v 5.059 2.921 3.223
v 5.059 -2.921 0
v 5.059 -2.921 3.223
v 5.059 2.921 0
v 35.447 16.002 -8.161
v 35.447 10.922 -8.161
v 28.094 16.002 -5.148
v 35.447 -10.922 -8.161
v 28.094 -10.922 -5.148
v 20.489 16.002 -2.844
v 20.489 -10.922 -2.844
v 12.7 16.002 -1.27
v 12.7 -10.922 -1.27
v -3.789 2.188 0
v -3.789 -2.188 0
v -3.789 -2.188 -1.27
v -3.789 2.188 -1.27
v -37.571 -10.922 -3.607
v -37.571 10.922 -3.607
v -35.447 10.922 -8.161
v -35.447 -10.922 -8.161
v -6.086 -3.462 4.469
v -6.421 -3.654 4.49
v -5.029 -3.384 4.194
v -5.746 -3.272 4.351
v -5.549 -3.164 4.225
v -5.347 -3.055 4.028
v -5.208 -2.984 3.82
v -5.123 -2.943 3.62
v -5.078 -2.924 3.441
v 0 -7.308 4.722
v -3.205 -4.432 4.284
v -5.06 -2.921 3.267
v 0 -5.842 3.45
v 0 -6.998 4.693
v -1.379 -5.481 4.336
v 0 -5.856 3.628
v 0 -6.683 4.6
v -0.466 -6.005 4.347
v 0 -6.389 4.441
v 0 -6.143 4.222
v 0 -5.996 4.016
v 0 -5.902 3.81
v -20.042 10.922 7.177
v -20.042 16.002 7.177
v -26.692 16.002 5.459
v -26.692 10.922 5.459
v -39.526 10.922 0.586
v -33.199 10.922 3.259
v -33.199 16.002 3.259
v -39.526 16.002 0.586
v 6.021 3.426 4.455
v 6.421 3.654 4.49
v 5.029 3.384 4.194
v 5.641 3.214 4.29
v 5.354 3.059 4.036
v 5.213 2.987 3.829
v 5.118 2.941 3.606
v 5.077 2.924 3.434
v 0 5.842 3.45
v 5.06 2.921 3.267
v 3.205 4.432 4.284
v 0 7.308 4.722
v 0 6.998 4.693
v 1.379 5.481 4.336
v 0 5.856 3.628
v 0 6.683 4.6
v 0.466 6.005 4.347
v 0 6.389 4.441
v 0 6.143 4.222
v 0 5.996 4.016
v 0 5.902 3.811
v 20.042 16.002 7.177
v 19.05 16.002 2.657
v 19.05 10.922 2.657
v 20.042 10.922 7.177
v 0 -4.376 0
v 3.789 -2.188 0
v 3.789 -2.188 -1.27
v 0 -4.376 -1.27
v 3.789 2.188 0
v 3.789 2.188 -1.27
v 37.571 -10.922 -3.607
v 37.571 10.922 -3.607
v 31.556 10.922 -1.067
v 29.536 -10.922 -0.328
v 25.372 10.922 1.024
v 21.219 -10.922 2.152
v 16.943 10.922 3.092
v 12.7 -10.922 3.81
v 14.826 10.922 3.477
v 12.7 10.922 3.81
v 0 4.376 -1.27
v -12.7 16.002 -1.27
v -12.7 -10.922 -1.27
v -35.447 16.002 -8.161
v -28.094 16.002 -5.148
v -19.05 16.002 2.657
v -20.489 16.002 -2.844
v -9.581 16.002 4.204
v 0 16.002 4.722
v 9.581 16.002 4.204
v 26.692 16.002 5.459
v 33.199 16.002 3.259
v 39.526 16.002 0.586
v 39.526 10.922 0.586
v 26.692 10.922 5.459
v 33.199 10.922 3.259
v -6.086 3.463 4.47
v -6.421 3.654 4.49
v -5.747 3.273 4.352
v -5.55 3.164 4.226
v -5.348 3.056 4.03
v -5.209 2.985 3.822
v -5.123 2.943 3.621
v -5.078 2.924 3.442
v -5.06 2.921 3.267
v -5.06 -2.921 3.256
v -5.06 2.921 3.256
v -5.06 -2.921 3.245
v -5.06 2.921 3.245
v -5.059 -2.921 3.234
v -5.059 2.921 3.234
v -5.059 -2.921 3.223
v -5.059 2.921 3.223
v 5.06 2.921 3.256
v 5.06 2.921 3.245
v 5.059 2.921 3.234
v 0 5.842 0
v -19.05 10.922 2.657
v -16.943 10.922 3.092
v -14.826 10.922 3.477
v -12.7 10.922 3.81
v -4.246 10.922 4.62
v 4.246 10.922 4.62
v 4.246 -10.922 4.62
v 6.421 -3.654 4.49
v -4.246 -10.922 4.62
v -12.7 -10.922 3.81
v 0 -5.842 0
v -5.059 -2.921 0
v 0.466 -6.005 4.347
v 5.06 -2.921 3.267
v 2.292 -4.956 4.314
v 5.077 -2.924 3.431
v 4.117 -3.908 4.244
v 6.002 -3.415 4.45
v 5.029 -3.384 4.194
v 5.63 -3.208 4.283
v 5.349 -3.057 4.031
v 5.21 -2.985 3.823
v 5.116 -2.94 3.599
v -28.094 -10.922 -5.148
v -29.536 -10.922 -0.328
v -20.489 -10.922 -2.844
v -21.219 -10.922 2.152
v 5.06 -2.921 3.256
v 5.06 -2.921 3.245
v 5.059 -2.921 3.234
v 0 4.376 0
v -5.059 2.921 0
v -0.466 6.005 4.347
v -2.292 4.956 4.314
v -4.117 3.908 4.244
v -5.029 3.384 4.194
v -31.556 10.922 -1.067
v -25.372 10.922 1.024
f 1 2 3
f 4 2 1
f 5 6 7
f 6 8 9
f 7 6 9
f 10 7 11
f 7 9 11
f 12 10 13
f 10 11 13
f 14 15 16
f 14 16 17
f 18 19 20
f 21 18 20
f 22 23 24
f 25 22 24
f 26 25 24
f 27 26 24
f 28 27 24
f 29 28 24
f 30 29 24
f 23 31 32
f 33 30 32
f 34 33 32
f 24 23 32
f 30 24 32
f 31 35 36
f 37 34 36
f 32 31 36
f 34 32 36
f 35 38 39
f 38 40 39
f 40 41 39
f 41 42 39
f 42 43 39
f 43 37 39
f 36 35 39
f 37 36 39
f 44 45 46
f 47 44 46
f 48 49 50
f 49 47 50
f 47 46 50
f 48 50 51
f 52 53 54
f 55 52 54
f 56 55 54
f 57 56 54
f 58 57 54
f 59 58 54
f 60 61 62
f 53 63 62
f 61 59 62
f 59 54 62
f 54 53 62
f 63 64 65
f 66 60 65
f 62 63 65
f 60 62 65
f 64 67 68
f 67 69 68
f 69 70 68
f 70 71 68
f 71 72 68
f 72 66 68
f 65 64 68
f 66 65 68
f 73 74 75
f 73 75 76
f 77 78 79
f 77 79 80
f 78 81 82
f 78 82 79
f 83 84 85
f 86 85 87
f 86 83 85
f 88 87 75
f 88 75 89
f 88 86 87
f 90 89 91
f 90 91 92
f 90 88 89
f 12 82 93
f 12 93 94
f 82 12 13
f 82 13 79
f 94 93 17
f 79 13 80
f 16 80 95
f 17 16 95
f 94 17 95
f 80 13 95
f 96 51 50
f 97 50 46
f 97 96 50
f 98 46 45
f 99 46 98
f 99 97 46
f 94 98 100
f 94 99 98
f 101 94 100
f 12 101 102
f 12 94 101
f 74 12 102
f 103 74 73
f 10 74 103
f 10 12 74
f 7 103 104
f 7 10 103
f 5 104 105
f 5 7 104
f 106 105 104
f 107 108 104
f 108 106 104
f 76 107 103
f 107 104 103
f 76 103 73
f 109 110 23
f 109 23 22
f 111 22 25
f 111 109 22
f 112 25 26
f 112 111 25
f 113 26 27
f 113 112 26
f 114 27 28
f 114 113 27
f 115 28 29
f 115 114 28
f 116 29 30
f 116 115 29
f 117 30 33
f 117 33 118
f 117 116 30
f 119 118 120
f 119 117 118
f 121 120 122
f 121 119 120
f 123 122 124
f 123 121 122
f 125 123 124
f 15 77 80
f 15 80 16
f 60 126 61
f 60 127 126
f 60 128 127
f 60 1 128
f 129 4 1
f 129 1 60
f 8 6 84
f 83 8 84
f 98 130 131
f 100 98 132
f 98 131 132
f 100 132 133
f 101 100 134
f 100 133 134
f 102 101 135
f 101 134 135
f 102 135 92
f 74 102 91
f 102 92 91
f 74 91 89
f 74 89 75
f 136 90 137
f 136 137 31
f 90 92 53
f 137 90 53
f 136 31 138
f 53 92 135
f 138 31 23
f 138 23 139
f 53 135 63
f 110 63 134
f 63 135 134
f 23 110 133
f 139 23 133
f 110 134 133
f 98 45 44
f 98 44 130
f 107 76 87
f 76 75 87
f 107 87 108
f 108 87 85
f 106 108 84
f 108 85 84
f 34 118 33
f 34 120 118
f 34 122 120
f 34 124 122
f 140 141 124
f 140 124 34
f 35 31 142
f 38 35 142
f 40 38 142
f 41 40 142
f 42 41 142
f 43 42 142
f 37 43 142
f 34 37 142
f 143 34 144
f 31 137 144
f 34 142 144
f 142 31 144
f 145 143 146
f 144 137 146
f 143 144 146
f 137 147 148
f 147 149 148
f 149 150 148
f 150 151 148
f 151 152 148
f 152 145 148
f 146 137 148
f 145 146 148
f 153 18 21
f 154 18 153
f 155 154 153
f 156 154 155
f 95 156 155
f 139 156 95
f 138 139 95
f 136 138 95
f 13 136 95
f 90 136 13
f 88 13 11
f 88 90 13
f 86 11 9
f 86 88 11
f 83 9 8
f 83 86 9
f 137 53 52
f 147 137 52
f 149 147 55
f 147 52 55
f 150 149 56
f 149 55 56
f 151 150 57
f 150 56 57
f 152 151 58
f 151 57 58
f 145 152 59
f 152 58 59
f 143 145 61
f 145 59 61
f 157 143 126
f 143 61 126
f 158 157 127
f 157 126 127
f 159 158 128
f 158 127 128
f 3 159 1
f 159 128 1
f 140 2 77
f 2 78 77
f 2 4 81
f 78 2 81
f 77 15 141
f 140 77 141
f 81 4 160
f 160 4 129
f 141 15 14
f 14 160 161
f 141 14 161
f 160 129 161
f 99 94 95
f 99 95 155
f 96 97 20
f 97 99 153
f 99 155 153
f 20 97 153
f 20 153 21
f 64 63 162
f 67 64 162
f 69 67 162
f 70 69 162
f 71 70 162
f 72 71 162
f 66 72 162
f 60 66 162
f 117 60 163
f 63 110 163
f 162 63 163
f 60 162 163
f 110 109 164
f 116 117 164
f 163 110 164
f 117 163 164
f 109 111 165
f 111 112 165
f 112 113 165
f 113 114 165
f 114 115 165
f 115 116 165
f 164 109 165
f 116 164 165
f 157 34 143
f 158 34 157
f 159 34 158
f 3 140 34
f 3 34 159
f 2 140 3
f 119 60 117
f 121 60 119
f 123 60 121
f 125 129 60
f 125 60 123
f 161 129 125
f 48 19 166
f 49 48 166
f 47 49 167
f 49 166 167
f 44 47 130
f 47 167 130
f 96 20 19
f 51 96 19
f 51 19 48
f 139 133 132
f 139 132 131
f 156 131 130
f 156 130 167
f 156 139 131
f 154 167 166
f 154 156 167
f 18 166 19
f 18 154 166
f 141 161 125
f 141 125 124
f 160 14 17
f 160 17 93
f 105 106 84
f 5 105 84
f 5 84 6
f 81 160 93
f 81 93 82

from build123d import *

# Parameters (mm, degrees)
SKETCH1_W                    = 25.4
SKETCH1_H                    = 21.844
BOLT_SIZE_WIDTH_HEIGHT_DEPTH = 7.62
FRONT_CURVE_DEPTH            = 22.844
SKETCH3_W                    = 25.4
SKETCH3_H                    = 21.844
REAR_CAP_DEPTH               = 1.27
WINGS_DEPTH                  = 21.844
HOOK_DEPTH_DEPTH             = 5.08
HOOK_HEIGHT_DEPTH            = 3.81
NUT_FLANGE_CLEARANCE_R       = 1.27
DECORATION_SIZE              = 2.54
CUT_EXTRUDE1_DEPTH           = 27.9240001


with BuildPart() as part:
    # Sketch1 → Bolt Size, Width, &Height (new body)
    with BuildSketch(Plane.XY):
        Rectangle(SKETCH1_W, SKETCH1_H)
        Polygon((0, 5.842), (-5.059320409, 2.921), (-5.059320409, -2.921), (0, -5.842), (5.059320409, -2.921), (5.059320409, 2.921), align=None, mode=Mode.SUBTRACT)
    extrude(amount=BOLT_SIZE_WIDTH_HEIGHT_DEPTH)

    # Sketch2 → Front Curve (cut, through all)
    with BuildSketch(Plane(origin=(0, 10.922, 0), x_dir=(1, 0, 0), z_dir=(0, 1, 0))):
        with BuildLine():
            Line((12.7, -7.62), (12.7, -3.81))
            ThreePointArc((12.7, -3.81), (0, -4.721818976), (-12.7, -3.81))
            Line((-12.7, -3.81), (-12.7, -7.62))
            Line((-12.7, -7.62), (12.7, -7.62))
        make_face()
    extrude(amount=-FRONT_CURVE_DEPTH, mode=Mode.SUBTRACT)

    # Sketch3 → Rear Cap (add)
    with BuildSketch(Plane(origin=(0, 0, 0), x_dir=(-1, 0, 0), z_dir=(0, 0, -1))):
        Rectangle(SKETCH3_W, SKETCH3_H)
        Polygon((-3.789320409, 2.187765158), (-3.789320409, -2.187765158), (0, -4.375530316), (3.789320409, -2.187765158), (3.789320409, 2.187765158), (0, 4.375530316), align=None, mode=Mode.SUBTRACT)
    extrude(amount=REAR_CAP_DEPTH)

    # Sketch6 → Wings (add)
    with BuildSketch(Plane.XZ.offset(10.922)):
        with BuildLine():
            ThreePointArc((-12.7, 3.81), (-25.407517395, 1.013767303), (-37.570763469, -3.607418757))
            Line((-37.570763469, -3.607418757), (-35.447209633, -8.161394654))
            ThreePointArc((-35.447209633, -8.161394654), (-24.318948968, -3.905861998), (-12.7, -1.27))
            Line((-12.7, -1.27), (-12.7, 3.81))
        make_face()
        with BuildLine():
            ThreePointArc((37.570763469, -3.607418757), (25.407517395, 1.013767303), (12.7, 3.81))
            Line((12.7, 3.81), (12.7, -1.27))
            ThreePointArc((12.7, -1.27), (24.318948968, -3.905861998), (35.447209633, -8.161394654))
            Line((35.447209633, -8.161394654), (37.570763469, -3.607418757))
        make_face()
    extrude(amount=-WINGS_DEPTH)

    # Sketch7 → Hook Depth (add)
    with BuildSketch(Plane(origin=(0, 10.922, 0), x_dir=(1, 0, 0), z_dir=(0, 1, 0))):
        with BuildLine():
            Line((12.7, 1.27), (-12.7, 1.27))
            ThreePointArc((-12.7, 1.27), (-24.318948968, 3.905861998), (-35.447209633, 8.161394654))
            Line((-35.447209633, 8.161394654), (-40.59977148, -2.888309885))
            ThreePointArc((-40.59977148, -2.888309885), (-30.779461435, -6.824786165), (-20.585837904, -9.657518799))
            Line((-20.585837904, -9.657518799), (-19.05, -2.656762978))
            ThreePointArc((-19.05, -2.656762978), (0, -4.721818976), (19.05, -2.656762978))
            Line((19.05, -2.656762978), (20.585837904, -9.657518799))
            ThreePointArc((20.585837904, -9.657518799), (30.779461435, -6.824786165), (40.59977148, -2.888309885))
            Line((40.59977148, -2.888309885), (35.447209633, 8.161394654))
            ThreePointArc((35.447209633, 8.161394654), (24.318948968, 3.905861998), (12.7, 1.27))
        make_face()
    extrude(amount=HOOK_DEPTH_DEPTH)

    # Sketch8 → Hook Height (add)
    with BuildSketch(Plane.XZ.offset(-10.922)):
        with BuildLine():
            ThreePointArc((-20.585837904, 9.657518799), (-30.779461435, 6.824786165), (-40.59977148, 2.888309885))
            Line((-40.59977148, 2.888309885), (-39.526321095, 0.586288106))
            ThreePointArc((-39.526321095, 0.586288106), (-29.965658216, 4.418684687), (-20.04155219, 7.176520399))
            Line((-20.04155219, 7.176520399), (-20.585837904, 9.657518799))
        make_face()
        with BuildLine():
            Line((39.526321095, 0.586288106), (40.59977148, 2.888309885))
            ThreePointArc((40.59977148, 2.888309885), (30.779461435, 6.824786165), (20.585837904, 9.657518799))
            Line((20.585837904, 9.657518799), (20.04155219, 7.176520399))
            ThreePointArc((20.04155219, 7.176520399), (29.965658216, 4.418684687), (39.526321095, 0.586288106))
        make_face()
    extrude(amount=HOOK_HEIGHT_DEPTH)

    # Nut Flange Clearance
    nut_flange_clearance_edges = [part.edges().sort_by_distance(p)[0] for p in [
        (5.059320409, 0, 4.577738649),
        (2.530429584, 4.381055799, 4.685798889),
        (-2.530429584, 4.381055799, 4.685798889),
        (-5.059320409, 0, 4.577738649),
        (-2.530429584, -4.381055799, 4.685798889),
        (2.530429584, -4.381055799, 4.685798889),
    ]]
    fillet(nut_flange_clearance_edges, radius=NUT_FLANGE_CLEARANCE_R)

    # Decoration
    decoration_edges = [part.edges().sort_by_distance(p)[0] for p in [
        (-40.063046287, 7.112, 1.737298996),
        (-20.313695047, 7.112, 8.417019599),
        (40.063046287, 7.112, 1.737298996),
        (20.313695047, 7.112, 8.417019599),
    ]]
    chamfer(decoration_edges, length=DECORATION_SIZE)

    # Sketch9 → Cut-Extrude1 (cut, through all)
    with BuildSketch(Plane(origin=(0, 16.002, 0), x_dir=(1, 0, 0), z_dir=(0, 1, 0))):
        with BuildLine():
            Line((40.59977148, -2.888309885), (39.526321095, -0.586288106))
            ThreePointArc((39.526321095, -0.586288106), (0, -9.349062527), (-39.526321095, -0.586288106))
            Line((-39.526321095, -0.586288106), (-40.59977148, -2.888309885))
            ThreePointArc((-40.59977148, -2.888309885), (0, -11.889062527), (40.59977148, -2.888309885))
        make_face()
    extrude(amount=-CUT_EXTRUDE1_DEPTH, mode=Mode.SUBTRACT)


solid = part.part
